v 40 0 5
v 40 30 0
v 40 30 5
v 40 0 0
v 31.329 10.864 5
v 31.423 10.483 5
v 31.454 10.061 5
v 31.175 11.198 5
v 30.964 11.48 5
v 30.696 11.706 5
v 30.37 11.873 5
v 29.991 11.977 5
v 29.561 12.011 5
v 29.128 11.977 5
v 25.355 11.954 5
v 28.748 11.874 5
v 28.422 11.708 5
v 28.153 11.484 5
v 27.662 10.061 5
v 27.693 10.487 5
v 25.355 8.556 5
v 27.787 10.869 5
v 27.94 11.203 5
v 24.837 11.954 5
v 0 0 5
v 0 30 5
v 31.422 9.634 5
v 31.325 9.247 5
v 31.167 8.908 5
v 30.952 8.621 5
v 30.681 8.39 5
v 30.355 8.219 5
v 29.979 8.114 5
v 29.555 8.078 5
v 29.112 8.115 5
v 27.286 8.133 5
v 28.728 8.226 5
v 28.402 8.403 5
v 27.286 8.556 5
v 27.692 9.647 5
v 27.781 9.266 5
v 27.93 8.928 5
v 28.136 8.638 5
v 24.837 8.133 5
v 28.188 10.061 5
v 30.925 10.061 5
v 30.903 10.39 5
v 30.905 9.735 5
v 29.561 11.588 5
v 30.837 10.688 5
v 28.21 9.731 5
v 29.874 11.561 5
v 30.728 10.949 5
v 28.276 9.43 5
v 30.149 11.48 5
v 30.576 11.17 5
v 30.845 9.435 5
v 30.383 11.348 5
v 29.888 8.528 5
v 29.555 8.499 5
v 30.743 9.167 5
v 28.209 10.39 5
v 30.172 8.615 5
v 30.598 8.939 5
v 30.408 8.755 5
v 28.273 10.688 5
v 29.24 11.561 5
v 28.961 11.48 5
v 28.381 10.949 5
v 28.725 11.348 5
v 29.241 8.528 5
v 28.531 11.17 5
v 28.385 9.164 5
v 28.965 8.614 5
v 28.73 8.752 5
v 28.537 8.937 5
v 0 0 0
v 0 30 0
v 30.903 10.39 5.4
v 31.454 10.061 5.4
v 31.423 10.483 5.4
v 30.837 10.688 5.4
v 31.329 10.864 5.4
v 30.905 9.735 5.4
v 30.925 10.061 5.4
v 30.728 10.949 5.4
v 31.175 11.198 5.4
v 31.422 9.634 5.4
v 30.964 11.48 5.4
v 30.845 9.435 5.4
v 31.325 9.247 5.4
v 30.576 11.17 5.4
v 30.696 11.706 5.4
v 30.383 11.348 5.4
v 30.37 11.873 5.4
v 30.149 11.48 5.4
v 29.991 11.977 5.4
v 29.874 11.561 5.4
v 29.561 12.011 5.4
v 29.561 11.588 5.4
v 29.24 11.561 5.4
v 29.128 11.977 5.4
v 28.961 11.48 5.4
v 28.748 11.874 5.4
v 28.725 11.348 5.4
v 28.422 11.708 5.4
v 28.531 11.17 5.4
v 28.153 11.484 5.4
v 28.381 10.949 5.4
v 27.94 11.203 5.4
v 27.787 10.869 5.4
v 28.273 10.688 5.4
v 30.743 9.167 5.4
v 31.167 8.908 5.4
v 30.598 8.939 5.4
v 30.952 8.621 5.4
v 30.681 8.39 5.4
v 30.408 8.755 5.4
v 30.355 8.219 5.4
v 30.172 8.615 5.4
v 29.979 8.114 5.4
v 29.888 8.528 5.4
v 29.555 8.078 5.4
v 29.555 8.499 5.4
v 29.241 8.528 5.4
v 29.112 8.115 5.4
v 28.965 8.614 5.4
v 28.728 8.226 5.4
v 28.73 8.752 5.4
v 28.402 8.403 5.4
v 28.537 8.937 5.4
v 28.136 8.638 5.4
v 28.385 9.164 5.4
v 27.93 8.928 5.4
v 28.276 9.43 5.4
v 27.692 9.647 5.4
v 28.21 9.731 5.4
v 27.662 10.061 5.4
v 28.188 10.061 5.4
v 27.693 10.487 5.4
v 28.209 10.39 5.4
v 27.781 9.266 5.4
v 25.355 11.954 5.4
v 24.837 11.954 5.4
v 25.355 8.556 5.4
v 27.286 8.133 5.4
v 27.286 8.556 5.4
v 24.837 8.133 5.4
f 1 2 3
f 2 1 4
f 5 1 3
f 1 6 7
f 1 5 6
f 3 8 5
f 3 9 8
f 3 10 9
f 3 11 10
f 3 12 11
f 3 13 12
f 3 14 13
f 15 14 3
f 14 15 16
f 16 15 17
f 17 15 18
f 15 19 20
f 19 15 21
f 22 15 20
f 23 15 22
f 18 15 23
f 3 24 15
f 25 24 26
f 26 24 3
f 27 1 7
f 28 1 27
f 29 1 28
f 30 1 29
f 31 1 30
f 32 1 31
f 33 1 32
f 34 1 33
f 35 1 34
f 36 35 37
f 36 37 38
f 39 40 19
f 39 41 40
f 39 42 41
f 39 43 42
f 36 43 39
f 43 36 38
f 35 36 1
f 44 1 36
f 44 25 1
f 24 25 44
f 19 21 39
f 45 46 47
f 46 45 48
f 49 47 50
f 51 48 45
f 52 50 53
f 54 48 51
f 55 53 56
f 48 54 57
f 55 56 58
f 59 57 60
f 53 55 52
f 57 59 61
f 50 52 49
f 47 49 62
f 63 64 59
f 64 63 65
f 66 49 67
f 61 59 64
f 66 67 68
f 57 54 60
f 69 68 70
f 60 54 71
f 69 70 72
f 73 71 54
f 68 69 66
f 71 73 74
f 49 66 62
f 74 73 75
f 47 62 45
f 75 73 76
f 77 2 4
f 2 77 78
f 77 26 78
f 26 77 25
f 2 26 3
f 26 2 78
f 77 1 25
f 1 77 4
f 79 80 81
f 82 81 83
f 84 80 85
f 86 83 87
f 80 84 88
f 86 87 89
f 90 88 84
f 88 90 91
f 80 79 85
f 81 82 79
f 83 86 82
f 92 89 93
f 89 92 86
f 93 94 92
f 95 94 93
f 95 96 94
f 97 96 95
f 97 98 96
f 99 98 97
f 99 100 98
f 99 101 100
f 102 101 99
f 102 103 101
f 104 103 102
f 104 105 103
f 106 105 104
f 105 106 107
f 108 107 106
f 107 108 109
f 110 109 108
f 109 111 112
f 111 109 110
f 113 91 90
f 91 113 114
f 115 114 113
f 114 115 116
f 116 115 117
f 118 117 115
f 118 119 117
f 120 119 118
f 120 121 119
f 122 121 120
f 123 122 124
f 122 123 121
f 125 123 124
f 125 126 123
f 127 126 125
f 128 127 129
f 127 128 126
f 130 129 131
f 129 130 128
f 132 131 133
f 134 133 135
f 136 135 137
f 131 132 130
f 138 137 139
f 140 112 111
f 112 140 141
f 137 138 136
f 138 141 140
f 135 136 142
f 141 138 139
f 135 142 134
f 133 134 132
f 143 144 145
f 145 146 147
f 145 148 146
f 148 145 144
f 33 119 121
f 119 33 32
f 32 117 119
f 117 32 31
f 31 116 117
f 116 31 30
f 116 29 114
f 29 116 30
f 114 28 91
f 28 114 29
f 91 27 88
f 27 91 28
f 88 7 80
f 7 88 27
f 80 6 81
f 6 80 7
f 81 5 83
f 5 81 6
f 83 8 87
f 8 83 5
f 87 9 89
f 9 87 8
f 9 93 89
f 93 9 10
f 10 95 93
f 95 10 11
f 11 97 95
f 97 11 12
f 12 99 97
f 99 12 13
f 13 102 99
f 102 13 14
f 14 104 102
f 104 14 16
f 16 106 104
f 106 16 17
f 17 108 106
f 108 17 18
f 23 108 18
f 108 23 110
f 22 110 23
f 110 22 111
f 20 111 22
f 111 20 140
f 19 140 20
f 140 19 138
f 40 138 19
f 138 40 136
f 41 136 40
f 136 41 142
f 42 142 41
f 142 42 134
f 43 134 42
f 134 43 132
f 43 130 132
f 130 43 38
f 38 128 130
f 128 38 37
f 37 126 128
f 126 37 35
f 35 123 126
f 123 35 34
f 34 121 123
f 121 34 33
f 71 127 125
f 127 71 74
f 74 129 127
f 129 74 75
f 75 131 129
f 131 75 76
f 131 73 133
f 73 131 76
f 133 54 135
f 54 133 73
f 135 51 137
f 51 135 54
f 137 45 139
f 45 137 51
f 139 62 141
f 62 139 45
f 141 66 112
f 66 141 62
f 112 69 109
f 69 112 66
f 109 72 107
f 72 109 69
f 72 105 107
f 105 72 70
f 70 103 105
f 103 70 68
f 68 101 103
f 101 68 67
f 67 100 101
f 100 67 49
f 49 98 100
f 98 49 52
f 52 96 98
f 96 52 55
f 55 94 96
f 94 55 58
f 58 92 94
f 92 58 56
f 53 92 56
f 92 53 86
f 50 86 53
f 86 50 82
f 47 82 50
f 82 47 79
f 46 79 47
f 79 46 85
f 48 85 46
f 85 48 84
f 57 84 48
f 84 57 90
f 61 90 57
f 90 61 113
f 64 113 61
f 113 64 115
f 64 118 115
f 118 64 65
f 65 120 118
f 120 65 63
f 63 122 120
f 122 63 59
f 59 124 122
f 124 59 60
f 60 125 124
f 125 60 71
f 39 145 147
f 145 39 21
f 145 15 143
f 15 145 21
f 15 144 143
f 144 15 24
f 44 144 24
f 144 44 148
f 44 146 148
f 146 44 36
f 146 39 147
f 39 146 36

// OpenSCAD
// Generated by scadwright. Do not hand-edit —
// edit the Python source and regenerate.

union() {
    cube([40, 30, 5], center=false);

    translate([28, 10, 4.5]) {
        linear_extrude(height=0.9, center=false) {
            text("LO", size=4, halign="center", valign="center");
        }
    }
}
